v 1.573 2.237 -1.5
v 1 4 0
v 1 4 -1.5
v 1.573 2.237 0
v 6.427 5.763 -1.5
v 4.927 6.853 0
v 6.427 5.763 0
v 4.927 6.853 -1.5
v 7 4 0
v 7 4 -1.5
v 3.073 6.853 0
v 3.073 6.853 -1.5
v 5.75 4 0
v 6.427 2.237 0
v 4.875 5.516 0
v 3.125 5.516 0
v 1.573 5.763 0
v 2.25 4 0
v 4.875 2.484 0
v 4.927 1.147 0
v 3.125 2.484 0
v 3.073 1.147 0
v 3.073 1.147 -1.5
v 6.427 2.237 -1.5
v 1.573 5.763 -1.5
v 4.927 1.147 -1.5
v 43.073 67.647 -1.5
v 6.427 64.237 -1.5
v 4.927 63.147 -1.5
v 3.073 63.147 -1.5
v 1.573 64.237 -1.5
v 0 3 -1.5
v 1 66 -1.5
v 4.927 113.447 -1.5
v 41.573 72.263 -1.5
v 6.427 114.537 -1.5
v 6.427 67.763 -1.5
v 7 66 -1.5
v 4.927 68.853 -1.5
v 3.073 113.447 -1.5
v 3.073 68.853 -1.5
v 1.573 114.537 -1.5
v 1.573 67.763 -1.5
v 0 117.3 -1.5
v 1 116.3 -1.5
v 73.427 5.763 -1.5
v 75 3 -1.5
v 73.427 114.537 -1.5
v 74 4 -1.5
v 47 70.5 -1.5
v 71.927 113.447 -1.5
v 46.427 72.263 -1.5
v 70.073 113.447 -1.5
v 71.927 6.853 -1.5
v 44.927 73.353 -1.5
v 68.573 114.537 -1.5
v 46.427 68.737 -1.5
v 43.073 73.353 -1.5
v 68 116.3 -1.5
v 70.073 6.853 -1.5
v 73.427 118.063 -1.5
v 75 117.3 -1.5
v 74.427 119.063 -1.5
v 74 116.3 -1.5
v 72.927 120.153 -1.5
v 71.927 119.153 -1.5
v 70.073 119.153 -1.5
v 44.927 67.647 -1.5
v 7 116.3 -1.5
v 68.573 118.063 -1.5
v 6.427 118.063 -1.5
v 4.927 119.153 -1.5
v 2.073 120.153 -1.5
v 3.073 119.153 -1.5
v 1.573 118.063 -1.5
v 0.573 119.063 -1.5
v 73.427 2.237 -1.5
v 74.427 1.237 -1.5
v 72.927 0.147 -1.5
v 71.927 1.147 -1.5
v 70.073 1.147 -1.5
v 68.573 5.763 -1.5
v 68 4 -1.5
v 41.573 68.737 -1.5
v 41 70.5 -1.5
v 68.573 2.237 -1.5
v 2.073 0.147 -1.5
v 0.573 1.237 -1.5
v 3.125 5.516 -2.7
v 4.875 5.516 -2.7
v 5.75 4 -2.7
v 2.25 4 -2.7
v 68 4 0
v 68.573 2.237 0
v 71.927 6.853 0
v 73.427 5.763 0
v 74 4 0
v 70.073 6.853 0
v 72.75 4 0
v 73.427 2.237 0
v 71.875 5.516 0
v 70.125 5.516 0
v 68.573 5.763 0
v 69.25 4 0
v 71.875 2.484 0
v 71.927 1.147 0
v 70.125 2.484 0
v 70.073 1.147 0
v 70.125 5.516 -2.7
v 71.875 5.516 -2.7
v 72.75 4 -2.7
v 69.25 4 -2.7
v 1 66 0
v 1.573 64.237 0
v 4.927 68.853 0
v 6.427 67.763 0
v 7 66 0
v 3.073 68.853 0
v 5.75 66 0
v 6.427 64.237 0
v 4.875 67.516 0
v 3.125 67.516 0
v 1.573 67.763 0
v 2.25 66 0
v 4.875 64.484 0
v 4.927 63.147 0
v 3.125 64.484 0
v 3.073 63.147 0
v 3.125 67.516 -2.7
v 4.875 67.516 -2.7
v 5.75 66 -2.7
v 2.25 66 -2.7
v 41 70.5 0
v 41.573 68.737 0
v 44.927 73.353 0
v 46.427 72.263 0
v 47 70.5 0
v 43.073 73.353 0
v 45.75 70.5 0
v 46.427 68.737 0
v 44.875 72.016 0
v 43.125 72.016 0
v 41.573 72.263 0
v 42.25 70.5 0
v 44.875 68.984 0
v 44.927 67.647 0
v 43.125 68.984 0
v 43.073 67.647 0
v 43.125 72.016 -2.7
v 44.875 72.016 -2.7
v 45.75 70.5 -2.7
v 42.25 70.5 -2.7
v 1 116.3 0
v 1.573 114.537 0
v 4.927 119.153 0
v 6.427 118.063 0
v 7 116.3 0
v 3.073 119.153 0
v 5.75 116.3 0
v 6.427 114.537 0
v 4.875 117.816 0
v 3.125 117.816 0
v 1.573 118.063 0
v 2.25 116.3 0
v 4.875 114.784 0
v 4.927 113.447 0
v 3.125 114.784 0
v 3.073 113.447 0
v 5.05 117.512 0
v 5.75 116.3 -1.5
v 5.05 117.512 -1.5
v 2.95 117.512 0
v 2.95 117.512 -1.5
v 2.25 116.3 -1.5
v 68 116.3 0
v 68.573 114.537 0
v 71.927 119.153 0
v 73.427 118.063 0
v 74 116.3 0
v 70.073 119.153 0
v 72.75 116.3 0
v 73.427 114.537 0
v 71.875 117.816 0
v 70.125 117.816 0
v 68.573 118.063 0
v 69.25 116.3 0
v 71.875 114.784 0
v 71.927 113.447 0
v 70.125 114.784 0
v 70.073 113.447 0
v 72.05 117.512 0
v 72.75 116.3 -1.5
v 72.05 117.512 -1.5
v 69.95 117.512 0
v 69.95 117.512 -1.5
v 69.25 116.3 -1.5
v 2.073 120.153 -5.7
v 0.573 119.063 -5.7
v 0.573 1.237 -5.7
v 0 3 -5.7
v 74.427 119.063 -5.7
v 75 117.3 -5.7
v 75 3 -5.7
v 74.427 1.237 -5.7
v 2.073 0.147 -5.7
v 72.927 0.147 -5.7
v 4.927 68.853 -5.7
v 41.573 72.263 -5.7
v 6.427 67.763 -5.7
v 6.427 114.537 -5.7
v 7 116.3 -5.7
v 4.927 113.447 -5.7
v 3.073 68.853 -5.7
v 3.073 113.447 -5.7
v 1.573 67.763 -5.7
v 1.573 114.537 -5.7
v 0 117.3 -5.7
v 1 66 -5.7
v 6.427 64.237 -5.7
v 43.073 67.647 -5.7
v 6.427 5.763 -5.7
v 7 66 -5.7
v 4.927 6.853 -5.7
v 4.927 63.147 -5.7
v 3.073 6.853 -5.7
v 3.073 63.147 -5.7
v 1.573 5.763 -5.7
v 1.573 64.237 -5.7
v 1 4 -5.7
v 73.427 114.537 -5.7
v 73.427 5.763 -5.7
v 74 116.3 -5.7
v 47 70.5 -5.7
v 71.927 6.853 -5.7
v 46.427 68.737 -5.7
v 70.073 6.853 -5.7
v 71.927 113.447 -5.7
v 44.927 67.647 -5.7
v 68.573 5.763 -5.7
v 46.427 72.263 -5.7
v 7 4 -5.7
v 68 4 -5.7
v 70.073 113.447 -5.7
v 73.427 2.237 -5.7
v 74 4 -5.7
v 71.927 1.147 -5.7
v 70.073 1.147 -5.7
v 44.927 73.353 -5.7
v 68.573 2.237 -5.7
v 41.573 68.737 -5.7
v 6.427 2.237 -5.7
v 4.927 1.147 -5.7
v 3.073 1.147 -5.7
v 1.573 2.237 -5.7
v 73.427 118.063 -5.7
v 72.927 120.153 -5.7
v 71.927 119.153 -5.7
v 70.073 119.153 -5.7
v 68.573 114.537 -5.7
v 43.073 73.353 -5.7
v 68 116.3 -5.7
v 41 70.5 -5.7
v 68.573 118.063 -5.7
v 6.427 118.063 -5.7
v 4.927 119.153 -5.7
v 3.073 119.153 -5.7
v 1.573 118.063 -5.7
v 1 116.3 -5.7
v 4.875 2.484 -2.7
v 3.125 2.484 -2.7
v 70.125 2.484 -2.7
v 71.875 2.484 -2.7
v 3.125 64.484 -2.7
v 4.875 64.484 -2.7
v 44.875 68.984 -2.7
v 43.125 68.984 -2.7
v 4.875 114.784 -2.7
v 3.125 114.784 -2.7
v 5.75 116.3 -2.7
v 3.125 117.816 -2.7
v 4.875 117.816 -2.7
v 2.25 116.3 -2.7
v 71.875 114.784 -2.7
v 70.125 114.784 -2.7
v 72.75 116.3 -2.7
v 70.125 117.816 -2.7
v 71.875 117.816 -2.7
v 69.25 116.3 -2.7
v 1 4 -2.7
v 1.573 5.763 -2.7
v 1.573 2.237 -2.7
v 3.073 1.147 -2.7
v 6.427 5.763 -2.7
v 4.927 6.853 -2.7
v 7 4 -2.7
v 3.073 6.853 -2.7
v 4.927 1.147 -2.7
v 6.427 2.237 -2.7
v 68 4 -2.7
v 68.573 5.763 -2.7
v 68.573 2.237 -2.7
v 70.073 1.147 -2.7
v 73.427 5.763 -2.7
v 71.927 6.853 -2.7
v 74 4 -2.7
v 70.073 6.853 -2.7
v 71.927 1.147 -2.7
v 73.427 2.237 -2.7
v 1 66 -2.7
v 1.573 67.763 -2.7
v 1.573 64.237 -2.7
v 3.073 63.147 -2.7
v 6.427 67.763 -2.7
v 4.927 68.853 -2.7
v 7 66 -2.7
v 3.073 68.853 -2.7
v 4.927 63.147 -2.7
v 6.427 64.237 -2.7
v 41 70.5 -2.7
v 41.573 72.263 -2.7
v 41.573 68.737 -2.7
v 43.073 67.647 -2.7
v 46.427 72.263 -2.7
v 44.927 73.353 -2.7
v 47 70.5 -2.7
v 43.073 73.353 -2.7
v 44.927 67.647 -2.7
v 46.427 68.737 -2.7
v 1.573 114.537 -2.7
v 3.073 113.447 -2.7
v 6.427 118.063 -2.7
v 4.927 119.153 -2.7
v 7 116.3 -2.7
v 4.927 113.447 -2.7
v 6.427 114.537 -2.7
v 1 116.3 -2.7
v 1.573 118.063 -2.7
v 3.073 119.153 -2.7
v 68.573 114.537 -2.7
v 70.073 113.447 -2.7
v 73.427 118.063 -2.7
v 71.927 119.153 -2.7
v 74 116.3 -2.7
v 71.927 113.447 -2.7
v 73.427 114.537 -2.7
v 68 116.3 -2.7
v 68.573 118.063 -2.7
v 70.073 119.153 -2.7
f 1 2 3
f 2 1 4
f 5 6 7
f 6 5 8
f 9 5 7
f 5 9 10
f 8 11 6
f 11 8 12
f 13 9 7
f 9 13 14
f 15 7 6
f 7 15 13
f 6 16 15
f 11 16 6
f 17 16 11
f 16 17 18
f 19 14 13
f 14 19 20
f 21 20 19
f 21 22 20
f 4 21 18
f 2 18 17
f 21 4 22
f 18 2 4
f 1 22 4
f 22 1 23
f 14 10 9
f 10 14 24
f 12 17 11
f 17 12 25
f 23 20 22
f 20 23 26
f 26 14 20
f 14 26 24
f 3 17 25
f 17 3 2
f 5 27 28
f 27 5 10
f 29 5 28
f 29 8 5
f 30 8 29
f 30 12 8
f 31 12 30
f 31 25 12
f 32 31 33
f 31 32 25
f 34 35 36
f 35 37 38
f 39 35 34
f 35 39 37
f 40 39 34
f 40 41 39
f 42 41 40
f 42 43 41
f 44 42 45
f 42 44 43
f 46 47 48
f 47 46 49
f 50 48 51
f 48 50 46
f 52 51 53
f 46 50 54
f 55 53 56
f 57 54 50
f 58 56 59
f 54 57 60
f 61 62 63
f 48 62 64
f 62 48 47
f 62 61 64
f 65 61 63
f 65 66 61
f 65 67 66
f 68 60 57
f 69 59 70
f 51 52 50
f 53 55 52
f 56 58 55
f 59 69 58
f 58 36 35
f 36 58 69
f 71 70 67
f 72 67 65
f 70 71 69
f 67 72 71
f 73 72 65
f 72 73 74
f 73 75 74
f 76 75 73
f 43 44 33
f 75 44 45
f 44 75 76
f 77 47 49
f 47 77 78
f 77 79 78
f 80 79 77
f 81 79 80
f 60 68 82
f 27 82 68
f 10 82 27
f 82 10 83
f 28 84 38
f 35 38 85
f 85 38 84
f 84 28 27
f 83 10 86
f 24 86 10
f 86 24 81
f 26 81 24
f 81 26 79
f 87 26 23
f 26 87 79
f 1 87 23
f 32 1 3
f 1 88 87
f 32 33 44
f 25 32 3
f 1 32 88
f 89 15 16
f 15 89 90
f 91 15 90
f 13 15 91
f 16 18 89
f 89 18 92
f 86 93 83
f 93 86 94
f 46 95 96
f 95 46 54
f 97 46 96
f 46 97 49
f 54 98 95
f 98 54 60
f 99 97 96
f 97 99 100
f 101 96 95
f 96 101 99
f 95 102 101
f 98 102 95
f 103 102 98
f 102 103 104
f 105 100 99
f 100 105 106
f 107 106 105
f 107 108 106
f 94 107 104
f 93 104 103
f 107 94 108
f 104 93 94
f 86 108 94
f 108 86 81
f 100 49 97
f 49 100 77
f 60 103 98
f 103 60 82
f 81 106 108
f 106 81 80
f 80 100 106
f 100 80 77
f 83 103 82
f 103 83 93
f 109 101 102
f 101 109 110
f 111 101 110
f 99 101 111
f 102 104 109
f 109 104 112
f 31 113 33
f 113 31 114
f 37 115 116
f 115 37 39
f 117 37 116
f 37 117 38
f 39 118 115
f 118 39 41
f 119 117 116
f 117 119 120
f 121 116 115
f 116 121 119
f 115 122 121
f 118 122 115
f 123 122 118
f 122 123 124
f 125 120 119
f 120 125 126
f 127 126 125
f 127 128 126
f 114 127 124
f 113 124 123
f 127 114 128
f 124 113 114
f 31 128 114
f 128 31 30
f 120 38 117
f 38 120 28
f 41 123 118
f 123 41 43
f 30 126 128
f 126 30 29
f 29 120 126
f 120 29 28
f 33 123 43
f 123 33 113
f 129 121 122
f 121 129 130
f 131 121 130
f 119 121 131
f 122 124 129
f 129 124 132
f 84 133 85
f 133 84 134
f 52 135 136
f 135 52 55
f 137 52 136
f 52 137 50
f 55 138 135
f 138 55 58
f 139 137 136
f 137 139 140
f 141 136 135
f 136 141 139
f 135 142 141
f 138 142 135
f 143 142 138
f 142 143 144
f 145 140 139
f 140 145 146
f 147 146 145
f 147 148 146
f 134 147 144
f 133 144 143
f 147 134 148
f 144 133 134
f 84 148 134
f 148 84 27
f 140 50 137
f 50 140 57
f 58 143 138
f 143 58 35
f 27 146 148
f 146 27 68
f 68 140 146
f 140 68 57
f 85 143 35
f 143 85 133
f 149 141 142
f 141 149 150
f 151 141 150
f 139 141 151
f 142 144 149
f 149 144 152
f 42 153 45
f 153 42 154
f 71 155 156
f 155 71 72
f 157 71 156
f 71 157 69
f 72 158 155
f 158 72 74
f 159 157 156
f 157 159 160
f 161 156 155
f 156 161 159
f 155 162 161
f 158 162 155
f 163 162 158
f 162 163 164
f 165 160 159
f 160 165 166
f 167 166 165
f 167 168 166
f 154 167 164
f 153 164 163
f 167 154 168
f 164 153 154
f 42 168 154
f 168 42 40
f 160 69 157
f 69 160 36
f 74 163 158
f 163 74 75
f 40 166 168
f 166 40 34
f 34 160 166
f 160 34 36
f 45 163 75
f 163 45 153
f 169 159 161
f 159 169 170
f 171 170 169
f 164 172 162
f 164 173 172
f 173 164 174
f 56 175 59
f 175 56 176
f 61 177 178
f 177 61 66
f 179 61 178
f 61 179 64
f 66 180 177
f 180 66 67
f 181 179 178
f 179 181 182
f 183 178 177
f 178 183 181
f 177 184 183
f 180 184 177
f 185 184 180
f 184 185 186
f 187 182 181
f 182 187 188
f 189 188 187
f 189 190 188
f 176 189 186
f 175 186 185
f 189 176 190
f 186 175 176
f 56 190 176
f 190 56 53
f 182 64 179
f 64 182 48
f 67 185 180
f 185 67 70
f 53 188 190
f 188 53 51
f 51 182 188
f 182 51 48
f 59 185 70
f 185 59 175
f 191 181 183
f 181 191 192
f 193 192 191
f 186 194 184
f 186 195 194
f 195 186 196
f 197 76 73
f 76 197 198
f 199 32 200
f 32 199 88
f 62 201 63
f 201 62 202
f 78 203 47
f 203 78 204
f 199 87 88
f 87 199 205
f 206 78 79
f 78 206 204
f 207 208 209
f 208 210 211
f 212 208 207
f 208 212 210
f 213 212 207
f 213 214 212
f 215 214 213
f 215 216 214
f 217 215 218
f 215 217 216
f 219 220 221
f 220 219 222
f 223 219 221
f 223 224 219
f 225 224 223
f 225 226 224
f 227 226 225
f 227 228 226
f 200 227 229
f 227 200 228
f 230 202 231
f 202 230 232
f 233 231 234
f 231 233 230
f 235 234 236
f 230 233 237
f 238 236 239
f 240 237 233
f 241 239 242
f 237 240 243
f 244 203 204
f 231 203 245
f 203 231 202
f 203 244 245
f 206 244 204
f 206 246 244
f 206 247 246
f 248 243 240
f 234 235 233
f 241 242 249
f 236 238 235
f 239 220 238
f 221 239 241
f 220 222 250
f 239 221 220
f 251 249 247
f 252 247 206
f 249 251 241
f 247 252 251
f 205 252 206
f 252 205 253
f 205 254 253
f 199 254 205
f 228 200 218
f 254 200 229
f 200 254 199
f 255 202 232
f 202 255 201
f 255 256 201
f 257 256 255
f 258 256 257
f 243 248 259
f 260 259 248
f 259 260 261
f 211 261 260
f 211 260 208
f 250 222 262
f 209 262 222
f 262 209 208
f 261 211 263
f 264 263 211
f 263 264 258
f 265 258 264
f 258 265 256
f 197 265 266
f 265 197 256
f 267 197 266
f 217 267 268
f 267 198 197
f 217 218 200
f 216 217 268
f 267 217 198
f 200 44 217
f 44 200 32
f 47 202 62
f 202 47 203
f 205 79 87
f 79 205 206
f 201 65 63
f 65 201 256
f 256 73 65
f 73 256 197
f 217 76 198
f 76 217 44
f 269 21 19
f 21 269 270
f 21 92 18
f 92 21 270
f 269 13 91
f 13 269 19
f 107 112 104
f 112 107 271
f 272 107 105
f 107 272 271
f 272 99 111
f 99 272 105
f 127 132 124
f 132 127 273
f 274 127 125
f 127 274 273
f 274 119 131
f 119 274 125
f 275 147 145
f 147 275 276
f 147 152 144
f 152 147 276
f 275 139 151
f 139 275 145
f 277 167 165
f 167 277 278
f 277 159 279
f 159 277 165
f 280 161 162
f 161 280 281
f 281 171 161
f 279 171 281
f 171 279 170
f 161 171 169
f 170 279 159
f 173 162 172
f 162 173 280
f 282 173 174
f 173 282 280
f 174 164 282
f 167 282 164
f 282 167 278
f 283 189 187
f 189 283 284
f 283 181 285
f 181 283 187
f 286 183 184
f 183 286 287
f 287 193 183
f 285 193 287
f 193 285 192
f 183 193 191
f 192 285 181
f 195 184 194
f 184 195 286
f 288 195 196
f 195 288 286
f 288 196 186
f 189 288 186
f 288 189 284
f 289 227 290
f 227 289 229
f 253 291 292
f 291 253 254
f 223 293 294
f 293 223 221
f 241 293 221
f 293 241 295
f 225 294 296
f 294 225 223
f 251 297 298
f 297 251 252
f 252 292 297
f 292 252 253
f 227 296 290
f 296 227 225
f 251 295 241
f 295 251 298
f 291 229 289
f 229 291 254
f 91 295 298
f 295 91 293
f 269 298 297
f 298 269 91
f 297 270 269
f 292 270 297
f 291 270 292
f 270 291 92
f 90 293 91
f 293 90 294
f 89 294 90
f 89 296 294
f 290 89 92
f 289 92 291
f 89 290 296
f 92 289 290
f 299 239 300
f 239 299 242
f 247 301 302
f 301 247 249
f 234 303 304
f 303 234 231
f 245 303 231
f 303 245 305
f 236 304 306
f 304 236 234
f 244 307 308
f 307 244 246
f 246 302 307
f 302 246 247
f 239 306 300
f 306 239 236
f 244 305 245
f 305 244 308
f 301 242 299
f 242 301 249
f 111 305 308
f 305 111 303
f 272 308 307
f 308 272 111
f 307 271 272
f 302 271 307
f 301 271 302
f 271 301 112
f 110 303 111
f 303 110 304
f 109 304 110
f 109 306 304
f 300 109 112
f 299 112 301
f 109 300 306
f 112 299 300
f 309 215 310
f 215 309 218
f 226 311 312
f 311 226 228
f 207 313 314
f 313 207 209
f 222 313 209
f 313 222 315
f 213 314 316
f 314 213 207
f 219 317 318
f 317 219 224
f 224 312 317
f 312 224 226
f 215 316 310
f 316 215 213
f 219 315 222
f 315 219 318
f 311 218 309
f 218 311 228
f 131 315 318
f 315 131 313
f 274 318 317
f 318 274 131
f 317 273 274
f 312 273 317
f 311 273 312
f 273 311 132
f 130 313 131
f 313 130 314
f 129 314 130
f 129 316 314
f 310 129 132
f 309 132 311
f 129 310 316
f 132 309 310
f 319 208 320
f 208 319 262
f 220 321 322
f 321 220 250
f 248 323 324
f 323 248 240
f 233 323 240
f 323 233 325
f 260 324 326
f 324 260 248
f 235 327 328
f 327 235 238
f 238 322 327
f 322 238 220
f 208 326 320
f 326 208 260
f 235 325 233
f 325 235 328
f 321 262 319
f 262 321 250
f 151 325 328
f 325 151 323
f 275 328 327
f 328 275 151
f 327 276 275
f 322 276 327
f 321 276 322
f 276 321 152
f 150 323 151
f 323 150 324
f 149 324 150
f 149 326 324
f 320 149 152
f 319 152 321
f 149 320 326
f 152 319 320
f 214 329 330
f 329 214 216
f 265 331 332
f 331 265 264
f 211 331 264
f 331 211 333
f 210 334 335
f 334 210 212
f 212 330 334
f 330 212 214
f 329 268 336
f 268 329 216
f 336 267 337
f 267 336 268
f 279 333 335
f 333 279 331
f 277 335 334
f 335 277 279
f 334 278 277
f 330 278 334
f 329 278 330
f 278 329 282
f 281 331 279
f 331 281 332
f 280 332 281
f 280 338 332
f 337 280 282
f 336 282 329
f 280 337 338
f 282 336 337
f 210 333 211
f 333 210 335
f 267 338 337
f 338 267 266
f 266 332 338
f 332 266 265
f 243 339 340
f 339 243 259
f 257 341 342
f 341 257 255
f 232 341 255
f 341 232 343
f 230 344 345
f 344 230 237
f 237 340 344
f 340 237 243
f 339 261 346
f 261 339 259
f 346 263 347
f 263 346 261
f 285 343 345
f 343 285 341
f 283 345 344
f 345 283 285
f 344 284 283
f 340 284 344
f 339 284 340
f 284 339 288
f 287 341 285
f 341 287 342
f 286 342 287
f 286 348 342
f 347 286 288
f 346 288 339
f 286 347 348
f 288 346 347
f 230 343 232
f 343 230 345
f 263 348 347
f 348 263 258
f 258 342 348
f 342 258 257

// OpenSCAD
/**
 *  Hack RF one enclosure
 *  uses brass m3 inserts
 *  printed in PLA
 */
 
 // Set facet size
 $fs = 2;
// $fs = 0.5;
 
 // All m3 holes
 m3r = 3.5/2;
 m3hr = 6/2;
 
 // Pcb dimensions
 pcb_x = 75;
 pcb_y = 120.3;
 pcb_z = 1.6;

 // pcb radius
 pcb_r = 3;
 
 pcb_x_pad = 1;
 pcb_y_pad = 1;
 
 // Bottom standoff
 bot_z_off = 1.5;
 
 // Wall thinkness
 wall = 1.2;
 
 // Wall thickness
 counter_sink = 3;
 bot_wall = counter_sink + wall;
 
 hole = [
    [4, 4],
    [pcb_x - 4, 4],
    [4, 66],
    [44, 70.5],
    [4, pcb_y - 4],
    [pcb_x - 4, pcb_y - 4],
 ];
 
 
 module bot_standoff ()
 {
     difference () {
        cylinder (r = m3hr, h = bot_z_off);
        cylinder (r = m3r, h = bot_z_off);
     }
 }

module bot_standoffs ()
{
        for (i = [0 : 5]) {
            translate ([hole[i][0], hole[i][1], 0])
            bot_standoff ();
        }
}

module rcube (x, y, z, r)
{
    hull () {
        translate ([r, r, 0])
        cylinder (r = r, h = z);
        translate ([x - r, r, 0])
        cylinder (r = r, h = z);
        translate ([r, y - r, 0])
        cylinder (r = r, h = z);
        translate ([x - r, y - r, 0])
        cylinder (r = r, h = z);
    }
}

module m3_holes (h)
{
    for (i = [0 : 5]) {
        translate ([hole[i][0], hole[i][1], 0])
        cylinder (r = m3r, h = h);
    }
}

module counter_sinks (h)
{
    for (i = [0 : 5]) {
        translate ([hole[i][0], hole[i][1], 0])
        cylinder (r = m3hr, h = h);
    }    
}

module side_b ()
{
    difference () {
        union () {
            translate ([0, 0, -bot_z_off - bot_wall])
            rcube (pcb_x, pcb_y, bot_wall, pcb_r);
            translate ([0, 0, -bot_z_off])
            bot_standoffs ();
        }
        
        // Remove screw hole
        translate ([0, 0, -bot_wall - bot_z_off])
        m3_holes (bot_wall + bot_z_off);

        // Remove counter sinks
        translate ([0, 0, -bot_z_off - bot_wall])
        counter_sinks (counter_sink);
    }
}

side_b ();
